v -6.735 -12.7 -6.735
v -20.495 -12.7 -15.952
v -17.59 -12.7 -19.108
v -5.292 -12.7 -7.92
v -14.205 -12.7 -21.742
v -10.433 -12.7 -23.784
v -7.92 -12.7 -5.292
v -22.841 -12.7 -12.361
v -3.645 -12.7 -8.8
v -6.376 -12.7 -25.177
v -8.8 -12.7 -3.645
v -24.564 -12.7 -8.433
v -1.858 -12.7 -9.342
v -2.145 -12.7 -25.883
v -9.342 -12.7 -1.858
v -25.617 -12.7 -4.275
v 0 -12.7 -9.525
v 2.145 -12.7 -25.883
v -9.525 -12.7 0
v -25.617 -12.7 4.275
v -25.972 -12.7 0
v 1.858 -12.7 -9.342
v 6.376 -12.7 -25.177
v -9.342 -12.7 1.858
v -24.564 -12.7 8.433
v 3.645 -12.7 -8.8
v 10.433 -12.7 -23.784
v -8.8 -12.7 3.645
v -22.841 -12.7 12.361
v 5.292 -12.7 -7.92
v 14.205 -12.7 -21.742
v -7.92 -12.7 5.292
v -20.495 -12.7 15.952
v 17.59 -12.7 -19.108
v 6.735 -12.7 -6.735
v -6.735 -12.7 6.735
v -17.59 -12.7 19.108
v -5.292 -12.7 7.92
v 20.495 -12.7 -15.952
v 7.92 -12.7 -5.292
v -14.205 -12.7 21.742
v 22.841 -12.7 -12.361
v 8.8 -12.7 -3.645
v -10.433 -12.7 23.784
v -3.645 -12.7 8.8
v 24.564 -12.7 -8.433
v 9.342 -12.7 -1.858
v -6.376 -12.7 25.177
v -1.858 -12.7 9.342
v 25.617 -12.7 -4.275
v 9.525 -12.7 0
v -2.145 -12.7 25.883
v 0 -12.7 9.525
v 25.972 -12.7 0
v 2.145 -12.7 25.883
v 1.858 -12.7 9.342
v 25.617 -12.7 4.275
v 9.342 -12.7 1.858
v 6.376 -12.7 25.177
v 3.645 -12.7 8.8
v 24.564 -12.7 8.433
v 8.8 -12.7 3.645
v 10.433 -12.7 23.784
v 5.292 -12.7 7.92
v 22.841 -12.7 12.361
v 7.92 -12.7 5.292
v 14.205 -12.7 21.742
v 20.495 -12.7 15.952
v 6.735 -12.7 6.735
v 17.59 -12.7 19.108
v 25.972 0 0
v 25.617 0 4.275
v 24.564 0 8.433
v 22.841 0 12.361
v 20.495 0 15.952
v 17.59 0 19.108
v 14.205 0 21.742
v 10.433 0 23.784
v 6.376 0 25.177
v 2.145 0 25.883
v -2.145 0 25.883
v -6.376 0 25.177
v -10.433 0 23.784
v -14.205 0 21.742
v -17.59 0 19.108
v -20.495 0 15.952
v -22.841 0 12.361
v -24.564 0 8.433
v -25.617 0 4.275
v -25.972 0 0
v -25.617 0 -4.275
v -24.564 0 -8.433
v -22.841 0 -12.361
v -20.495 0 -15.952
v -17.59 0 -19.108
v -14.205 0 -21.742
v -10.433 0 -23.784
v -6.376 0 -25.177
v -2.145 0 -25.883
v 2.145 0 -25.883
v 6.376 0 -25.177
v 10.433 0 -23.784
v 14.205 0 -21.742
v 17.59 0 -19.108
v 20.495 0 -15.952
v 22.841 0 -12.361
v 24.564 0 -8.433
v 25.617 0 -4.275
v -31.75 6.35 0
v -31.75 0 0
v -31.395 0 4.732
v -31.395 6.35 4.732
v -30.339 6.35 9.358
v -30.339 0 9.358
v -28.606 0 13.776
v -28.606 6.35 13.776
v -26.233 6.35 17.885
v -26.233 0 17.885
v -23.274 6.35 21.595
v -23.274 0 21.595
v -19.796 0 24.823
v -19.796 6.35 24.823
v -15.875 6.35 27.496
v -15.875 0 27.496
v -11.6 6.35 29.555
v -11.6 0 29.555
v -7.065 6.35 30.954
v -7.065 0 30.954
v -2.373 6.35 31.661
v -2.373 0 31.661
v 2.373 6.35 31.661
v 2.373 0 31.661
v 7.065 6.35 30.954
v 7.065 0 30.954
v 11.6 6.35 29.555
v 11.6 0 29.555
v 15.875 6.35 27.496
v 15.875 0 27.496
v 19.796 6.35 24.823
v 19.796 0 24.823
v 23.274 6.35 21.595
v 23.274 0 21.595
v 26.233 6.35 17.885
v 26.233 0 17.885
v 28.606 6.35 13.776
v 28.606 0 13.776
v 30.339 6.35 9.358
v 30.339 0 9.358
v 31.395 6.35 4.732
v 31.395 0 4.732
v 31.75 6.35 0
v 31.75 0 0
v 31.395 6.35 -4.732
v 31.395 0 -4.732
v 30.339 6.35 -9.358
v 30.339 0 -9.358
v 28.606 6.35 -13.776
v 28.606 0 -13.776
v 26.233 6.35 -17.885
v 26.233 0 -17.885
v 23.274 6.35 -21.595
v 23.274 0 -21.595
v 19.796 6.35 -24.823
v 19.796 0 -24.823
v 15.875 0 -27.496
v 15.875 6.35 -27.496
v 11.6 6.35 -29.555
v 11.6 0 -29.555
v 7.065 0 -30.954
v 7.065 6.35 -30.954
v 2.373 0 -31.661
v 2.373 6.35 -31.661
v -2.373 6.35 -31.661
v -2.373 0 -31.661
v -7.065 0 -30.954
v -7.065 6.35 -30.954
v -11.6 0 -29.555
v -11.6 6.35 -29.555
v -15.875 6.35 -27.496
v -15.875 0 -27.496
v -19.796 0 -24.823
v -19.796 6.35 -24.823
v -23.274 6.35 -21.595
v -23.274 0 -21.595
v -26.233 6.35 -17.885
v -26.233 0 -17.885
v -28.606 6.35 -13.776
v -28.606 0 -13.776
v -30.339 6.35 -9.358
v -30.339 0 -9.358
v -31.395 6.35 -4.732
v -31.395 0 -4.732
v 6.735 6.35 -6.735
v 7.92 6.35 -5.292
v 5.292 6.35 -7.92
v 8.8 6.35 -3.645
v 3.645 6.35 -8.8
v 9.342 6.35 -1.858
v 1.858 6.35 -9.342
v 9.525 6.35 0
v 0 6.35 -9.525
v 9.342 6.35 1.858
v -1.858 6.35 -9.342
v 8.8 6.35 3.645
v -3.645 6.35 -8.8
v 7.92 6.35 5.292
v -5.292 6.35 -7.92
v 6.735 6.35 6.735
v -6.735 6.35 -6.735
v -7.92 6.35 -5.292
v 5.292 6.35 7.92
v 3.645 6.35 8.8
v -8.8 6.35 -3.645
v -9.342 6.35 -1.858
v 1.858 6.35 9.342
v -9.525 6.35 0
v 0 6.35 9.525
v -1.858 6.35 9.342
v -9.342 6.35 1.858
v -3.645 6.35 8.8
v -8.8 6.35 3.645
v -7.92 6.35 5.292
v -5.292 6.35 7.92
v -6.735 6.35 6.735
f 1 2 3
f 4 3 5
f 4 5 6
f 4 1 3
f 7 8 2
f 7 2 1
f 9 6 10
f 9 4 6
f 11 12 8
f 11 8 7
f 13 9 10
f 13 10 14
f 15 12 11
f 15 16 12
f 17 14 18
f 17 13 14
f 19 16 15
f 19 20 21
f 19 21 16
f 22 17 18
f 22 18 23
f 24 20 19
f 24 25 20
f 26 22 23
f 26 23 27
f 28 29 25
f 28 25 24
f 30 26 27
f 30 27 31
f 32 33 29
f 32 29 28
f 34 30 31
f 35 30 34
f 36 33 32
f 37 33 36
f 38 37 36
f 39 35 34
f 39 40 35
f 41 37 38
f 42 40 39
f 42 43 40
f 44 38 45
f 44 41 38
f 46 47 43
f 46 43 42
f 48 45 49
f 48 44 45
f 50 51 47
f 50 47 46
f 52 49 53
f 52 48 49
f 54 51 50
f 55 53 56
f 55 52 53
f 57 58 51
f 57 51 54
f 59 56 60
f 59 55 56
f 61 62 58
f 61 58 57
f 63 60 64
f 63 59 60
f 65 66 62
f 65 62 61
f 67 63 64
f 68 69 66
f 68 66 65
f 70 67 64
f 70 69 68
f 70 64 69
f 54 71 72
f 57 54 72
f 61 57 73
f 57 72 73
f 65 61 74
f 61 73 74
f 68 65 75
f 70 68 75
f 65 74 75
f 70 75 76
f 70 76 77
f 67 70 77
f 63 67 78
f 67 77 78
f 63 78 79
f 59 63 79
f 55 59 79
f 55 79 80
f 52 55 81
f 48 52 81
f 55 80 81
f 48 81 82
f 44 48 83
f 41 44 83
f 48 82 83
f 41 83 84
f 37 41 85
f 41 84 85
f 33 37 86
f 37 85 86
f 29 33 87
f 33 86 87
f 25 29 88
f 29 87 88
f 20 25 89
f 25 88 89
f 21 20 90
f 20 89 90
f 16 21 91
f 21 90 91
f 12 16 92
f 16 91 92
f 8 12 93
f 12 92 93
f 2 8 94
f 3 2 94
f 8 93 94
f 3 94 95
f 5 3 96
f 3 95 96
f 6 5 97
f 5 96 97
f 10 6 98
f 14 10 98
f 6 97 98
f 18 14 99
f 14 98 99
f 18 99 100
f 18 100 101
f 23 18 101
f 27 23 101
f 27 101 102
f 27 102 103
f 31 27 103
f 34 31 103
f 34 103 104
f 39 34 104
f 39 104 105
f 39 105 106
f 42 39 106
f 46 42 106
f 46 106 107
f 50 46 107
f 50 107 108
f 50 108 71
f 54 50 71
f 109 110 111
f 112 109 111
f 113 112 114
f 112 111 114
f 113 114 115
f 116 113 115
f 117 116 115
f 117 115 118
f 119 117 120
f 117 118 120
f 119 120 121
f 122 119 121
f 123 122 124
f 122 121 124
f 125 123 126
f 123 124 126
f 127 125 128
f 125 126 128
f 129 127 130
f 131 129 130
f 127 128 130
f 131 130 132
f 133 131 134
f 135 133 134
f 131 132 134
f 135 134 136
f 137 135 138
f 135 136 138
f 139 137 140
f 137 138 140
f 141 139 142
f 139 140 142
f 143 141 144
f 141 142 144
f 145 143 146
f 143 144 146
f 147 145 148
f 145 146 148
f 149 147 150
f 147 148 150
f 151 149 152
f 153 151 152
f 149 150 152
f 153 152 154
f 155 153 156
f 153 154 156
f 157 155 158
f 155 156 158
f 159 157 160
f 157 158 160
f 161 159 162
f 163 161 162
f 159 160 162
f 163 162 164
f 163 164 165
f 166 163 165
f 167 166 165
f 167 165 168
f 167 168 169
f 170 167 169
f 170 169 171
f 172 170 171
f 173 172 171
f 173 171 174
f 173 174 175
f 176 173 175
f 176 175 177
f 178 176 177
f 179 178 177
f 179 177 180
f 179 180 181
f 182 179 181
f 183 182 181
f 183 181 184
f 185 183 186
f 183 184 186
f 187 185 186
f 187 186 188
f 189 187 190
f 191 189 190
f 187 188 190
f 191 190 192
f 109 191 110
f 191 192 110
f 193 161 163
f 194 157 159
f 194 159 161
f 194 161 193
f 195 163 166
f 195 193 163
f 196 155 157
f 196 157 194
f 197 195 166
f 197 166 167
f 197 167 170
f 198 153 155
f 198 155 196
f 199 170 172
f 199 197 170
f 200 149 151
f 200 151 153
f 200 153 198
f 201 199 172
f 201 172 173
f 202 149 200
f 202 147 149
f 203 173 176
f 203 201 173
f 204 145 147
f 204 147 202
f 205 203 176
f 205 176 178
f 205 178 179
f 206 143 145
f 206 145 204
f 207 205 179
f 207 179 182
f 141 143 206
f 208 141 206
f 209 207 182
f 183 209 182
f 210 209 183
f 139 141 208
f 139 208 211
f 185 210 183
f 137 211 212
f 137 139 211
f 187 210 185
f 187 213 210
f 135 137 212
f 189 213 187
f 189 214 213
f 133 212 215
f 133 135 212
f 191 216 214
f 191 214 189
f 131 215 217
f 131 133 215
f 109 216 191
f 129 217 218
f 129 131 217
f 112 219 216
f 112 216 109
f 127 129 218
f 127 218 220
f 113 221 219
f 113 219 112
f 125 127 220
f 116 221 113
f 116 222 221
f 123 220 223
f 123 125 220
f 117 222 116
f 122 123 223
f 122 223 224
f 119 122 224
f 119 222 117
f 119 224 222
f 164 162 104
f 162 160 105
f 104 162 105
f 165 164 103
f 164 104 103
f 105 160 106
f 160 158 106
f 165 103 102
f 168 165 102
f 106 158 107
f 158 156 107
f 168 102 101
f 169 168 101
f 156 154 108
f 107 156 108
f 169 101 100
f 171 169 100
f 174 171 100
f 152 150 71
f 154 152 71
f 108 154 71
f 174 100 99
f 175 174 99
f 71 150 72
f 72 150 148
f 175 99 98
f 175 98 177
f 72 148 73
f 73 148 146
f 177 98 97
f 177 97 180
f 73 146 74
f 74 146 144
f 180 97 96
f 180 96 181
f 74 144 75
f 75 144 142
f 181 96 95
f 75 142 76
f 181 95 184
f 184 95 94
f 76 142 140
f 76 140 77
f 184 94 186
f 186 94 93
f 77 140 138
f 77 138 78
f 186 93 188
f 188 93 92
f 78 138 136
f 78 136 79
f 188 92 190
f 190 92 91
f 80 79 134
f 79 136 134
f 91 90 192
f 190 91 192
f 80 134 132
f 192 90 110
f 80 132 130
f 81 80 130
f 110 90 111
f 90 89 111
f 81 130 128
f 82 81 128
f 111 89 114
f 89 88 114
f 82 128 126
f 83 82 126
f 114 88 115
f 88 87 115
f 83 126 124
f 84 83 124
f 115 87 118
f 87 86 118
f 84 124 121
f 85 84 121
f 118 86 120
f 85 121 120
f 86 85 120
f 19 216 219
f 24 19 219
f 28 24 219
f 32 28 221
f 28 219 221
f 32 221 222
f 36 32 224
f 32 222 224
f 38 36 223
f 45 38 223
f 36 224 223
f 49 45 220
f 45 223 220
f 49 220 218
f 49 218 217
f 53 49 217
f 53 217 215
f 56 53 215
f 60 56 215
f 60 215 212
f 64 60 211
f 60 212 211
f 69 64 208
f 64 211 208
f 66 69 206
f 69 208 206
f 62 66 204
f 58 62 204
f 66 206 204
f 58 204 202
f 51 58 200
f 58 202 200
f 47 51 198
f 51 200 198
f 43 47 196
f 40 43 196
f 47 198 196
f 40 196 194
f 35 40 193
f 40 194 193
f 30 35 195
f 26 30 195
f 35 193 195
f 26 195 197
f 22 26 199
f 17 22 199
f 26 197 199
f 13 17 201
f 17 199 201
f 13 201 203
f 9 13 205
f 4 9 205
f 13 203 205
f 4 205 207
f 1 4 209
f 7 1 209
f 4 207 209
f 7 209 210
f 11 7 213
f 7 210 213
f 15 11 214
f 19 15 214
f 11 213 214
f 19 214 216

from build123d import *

# Parameters (mm, degrees)
F0_R     = 25.9715
F1_DEPTH = 12.7
F2_R     = 31.75
F3_DEPTH = 6.35
F4_R     = 9.525
F5_DEPTH = 19.05


with BuildPart() as f1:
    # F0 (on Front) → F1 (new body)
    with BuildSketch(Plane.XZ):
        Circle(F0_R)
    extrude(amount=F1_DEPTH)

    # F2 (on face) → F3 (join)
    with BuildSketch(Plane(origin=(0, 0, 0), x_dir=(-1, 0, 0), z_dir=(0, 1, 0))):
        Circle(F2_R)
    extrude(amount=F3_DEPTH)

    # F4 (on face) → F5 (cut, through all)
    with BuildSketch(Plane(origin=(0, 6.35, 0), x_dir=(-1, 0, 0), z_dir=(0, 1, 0))):
        Circle(F4_R)
    extrude(amount=-F5_DEPTH, mode=Mode.SUBTRACT)


solid = f1.part
